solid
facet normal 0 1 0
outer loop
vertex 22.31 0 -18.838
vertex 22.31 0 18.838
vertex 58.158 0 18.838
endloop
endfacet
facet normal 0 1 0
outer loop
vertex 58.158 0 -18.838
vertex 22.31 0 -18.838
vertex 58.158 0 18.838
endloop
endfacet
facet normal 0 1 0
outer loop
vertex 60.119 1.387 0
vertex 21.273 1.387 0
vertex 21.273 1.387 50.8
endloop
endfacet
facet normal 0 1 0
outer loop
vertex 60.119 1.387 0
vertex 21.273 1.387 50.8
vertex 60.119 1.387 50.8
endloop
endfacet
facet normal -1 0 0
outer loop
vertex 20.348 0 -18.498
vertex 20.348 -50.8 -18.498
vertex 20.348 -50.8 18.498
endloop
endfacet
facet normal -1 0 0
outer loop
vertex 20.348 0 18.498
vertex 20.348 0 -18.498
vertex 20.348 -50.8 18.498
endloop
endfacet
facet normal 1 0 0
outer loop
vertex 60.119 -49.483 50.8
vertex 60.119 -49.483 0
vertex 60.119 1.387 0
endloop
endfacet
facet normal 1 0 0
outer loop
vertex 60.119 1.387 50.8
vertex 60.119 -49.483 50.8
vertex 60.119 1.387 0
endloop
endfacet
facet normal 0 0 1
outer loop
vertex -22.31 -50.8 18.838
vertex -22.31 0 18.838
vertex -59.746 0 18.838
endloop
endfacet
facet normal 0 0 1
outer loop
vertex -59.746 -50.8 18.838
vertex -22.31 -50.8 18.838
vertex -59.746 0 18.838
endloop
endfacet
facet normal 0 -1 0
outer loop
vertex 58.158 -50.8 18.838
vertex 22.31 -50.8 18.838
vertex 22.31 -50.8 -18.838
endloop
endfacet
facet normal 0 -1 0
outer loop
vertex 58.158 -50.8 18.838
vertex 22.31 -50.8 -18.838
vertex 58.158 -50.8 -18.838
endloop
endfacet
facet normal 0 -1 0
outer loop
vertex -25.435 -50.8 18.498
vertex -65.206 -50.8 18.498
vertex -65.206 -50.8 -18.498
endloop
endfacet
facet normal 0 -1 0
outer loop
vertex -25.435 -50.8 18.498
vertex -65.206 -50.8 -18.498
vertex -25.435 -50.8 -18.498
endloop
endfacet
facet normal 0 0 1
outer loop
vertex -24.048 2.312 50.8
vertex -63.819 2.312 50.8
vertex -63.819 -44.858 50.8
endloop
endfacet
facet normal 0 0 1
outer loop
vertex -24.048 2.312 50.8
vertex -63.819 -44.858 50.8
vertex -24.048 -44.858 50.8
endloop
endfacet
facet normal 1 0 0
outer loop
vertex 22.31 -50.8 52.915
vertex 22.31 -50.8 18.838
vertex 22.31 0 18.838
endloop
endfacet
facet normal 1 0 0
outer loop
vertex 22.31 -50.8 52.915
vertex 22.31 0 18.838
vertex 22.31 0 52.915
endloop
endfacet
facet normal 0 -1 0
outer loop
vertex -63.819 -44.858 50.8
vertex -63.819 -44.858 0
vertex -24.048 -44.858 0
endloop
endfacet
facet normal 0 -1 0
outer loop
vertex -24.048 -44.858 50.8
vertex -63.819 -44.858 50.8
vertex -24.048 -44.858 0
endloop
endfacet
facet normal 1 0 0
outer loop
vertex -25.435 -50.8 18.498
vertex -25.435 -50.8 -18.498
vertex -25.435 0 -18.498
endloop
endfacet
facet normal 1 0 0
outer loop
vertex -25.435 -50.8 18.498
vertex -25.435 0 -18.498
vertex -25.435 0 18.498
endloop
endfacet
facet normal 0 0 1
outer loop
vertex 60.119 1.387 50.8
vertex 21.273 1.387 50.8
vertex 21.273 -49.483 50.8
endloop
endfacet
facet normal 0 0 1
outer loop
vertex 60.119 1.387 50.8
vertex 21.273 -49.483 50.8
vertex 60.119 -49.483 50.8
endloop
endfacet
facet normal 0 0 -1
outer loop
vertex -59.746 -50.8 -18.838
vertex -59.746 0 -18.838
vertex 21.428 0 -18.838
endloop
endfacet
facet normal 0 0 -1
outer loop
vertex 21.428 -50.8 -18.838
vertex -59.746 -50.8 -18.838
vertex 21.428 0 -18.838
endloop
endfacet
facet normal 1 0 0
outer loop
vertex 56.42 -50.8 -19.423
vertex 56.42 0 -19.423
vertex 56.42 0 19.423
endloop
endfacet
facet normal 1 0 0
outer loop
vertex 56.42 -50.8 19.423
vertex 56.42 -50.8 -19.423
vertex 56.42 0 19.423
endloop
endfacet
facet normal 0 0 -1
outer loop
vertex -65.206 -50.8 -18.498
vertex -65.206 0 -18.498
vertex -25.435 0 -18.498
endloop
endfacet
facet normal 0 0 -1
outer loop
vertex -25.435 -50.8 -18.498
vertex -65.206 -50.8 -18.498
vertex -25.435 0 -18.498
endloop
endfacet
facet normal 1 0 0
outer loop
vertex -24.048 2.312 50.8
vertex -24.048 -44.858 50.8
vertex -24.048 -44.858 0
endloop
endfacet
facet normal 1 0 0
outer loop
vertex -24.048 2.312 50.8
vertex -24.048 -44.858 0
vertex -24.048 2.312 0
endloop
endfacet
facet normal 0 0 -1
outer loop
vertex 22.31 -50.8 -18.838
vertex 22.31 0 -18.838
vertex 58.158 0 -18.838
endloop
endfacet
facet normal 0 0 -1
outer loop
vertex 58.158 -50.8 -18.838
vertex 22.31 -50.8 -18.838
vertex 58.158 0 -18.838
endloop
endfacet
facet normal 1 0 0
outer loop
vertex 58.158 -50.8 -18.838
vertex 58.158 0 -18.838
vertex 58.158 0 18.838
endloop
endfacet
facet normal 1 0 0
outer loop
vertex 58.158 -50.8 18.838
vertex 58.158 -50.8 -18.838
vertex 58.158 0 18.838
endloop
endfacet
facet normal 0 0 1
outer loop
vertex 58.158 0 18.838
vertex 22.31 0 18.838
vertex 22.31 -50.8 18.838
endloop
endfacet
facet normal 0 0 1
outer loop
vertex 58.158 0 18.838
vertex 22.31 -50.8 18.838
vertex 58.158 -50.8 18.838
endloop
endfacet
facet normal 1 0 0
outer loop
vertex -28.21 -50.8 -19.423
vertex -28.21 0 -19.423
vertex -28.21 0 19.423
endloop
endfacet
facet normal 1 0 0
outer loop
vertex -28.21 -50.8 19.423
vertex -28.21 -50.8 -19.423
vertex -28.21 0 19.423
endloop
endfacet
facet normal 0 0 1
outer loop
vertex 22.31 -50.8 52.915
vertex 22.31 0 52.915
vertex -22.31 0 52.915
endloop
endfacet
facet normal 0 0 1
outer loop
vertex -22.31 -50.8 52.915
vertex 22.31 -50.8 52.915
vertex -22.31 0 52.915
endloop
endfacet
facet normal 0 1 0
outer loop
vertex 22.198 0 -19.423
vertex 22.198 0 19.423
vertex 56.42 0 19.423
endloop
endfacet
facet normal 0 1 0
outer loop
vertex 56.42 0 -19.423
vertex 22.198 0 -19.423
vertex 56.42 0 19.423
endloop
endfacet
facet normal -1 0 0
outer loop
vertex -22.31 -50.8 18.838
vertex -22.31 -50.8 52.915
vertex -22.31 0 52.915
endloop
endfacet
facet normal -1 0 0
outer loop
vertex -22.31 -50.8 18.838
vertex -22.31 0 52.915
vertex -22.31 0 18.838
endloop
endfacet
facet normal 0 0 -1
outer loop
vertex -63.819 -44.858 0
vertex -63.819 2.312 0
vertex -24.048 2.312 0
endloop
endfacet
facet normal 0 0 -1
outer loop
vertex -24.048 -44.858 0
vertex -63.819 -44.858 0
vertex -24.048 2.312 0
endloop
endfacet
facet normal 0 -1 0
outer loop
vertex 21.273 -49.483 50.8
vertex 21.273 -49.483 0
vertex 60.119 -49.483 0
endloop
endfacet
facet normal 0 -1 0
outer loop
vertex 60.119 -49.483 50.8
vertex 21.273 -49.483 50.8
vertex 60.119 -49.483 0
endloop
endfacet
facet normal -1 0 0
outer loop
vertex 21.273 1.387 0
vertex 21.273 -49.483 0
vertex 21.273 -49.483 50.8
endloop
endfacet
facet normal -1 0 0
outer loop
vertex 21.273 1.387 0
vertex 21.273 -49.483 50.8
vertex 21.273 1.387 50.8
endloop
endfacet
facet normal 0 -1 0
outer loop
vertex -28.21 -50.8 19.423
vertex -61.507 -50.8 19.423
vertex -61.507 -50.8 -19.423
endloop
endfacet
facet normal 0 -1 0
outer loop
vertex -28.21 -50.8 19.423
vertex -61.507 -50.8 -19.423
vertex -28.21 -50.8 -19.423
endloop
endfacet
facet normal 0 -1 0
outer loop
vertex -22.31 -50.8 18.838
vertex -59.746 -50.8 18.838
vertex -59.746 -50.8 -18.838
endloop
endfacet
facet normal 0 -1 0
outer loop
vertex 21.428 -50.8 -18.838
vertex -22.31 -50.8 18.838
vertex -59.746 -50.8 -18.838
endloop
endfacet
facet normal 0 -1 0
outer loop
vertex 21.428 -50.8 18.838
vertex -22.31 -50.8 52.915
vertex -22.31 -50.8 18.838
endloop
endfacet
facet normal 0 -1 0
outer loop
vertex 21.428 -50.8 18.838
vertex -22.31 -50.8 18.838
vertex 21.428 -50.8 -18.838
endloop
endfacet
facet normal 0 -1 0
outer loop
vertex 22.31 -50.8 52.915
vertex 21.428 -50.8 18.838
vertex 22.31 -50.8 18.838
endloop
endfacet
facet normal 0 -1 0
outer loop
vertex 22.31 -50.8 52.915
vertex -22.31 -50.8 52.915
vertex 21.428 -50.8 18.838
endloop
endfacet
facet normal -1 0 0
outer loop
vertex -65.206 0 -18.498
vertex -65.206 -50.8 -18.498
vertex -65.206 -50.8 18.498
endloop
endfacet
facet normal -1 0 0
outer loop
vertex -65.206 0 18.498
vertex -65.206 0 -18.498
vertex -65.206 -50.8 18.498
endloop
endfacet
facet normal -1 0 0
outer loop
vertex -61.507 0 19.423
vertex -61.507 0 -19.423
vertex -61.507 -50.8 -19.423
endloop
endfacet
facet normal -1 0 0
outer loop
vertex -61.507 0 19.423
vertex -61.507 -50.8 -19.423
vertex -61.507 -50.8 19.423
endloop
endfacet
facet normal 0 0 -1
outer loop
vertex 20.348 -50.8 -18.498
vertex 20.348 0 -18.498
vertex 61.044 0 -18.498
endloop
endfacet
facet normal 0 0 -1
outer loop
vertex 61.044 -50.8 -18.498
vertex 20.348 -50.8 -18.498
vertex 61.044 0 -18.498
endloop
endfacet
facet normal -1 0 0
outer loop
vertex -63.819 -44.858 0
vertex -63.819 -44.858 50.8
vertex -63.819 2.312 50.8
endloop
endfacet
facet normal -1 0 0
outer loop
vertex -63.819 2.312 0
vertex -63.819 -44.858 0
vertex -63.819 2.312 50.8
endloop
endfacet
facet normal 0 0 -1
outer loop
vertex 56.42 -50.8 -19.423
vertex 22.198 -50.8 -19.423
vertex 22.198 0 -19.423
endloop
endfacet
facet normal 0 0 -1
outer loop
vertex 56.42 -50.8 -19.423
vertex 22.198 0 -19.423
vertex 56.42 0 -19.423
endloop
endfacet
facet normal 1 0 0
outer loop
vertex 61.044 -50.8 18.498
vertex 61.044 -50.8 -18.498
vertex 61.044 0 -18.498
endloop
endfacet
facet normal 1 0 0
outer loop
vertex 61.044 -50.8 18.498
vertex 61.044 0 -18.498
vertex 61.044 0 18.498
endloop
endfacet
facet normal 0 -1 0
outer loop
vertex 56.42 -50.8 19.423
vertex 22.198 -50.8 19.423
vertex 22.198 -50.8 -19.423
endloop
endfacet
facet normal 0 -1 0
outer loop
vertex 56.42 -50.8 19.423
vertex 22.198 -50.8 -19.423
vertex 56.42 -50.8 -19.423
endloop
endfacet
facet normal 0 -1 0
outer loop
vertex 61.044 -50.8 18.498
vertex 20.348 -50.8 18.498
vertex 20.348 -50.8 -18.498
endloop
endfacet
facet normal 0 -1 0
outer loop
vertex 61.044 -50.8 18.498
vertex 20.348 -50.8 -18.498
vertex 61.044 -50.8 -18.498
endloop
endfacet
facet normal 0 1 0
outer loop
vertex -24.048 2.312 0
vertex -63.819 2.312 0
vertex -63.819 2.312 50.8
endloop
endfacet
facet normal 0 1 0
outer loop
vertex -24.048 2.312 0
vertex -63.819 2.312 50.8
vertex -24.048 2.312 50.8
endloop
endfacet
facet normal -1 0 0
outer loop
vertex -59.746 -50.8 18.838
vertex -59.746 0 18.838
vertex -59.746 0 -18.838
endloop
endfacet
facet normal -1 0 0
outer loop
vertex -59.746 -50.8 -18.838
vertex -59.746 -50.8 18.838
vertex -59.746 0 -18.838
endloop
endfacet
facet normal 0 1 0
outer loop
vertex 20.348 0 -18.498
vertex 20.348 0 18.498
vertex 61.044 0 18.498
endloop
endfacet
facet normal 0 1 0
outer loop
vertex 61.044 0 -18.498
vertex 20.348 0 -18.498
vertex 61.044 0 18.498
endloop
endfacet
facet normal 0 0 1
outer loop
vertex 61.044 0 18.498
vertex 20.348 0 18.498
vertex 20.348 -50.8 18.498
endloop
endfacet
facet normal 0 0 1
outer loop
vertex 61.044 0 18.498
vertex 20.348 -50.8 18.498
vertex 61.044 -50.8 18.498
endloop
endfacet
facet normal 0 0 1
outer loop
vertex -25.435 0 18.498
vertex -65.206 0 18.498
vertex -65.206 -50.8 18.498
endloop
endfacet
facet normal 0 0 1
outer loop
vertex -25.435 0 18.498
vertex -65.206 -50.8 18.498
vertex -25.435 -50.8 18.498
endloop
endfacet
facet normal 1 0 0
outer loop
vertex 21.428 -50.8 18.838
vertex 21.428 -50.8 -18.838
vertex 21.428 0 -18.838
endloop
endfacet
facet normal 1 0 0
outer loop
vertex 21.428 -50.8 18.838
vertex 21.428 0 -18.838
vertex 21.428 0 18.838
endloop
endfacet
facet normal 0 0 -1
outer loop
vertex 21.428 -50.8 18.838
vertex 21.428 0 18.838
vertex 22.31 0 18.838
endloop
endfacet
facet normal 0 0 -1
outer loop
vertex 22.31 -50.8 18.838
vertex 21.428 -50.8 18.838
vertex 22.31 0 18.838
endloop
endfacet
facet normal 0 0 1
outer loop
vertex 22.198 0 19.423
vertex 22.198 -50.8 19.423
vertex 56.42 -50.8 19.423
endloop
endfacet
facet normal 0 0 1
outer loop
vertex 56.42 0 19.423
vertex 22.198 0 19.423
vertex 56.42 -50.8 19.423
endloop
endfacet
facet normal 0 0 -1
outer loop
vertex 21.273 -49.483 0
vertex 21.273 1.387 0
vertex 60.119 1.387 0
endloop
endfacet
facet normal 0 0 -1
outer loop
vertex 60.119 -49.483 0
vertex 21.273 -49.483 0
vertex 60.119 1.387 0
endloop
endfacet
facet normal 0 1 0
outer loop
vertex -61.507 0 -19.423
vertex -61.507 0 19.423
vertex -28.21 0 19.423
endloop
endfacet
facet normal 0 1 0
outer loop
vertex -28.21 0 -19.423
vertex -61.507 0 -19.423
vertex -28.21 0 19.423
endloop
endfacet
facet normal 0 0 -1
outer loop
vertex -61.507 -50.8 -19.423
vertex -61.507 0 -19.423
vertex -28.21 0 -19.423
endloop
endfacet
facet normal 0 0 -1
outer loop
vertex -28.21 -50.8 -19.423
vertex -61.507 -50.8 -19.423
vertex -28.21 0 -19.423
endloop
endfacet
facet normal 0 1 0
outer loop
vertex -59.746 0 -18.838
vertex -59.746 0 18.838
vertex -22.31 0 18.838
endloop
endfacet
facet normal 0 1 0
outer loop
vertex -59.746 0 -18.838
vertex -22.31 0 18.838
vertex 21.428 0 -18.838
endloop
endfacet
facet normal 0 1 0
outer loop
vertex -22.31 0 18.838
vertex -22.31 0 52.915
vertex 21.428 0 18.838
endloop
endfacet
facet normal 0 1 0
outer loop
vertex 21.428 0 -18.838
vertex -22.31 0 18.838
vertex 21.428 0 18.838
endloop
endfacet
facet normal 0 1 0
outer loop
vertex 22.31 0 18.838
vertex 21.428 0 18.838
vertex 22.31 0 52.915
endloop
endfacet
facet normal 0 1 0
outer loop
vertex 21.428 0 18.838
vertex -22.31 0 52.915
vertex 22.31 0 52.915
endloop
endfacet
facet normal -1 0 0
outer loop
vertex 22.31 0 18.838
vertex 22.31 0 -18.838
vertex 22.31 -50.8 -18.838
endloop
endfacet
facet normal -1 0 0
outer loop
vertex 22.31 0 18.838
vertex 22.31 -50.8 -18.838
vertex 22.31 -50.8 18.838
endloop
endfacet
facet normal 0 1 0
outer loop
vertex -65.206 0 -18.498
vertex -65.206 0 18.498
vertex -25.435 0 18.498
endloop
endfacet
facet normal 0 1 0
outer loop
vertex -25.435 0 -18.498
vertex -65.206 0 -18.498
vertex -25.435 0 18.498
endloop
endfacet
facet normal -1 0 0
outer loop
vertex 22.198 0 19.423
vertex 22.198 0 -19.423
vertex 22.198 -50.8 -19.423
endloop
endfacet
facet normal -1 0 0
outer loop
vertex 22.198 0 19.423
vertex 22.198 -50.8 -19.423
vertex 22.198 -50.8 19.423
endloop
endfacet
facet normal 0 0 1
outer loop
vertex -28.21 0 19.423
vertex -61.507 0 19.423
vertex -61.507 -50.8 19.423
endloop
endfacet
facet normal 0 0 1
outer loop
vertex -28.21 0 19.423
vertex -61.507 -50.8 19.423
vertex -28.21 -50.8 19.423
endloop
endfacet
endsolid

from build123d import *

# Parameters (mm, degrees)
F0_W     = 35.8476921521
F0_H     = 37.6757253713
F1_DEPTH = 50.8
F0_W_2   = 42.0716410177
F0_W_3   = 0.7847153441
F2_W     = 39.7713258862
F2_H     = 36.9965732098
F3_DEPTH = 50.8
F2_W_2   = 40.696233511
F4_W     = 33.2969166338
F4_H     = 38.8464033604
F5_DEPTH = 50.8
F4_W_2   = 34.2218503356
F6_W     = 38.8464033604
F6_H     = 50.8703030646
F7_DEPTH = 50.8
F6_W_2   = 39.7713184357
F6_H_2   = 47.1706353128


with BuildPart() as f1:
    # F0 (on Front) → F1 (new body)
    with BuildSketch(Plane.XZ):
        with Locations((40.2337796986, 0)):
            Rectangle(F0_W, F0_H)
    extrude(amount=F1_DEPTH)


with BuildPart() as f1b:
    # F0 (on Front) → F1, piece 2 (new body)
    with BuildSketch(Plane.XZ):
        with Locations((0.392357672, 0)):
            Rectangle(F0_W_2, F0_H)
        with Locations((-21.0358205089, 0)):
            Rectangle(F0_W_3, F0_H)
        Polygon((-20.6434628368, 18.8378626856), (21.4281781809, 18.8378626856), (22.3099336226, 18.8378626856), (22.3099336226, 52.9146460188), (-22.3099336226, 52.9146460188), (-22.3099336226, 18.8378626856), (-21.4281781809, 18.8378626856), align=None)
        Polygon((-59.746069642, -18.8378626856), (-21.4281781809, -18.8378626856), (-21.4281781809, 18.8378626856), (-22.3099336226, 18.8378626856), (-59.746069642, 18.8378626856), align=None)
    extrude(amount=F1_DEPTH)


with BuildPart() as f3:
    # F2 (on Front) → F3 (new body)
    with BuildSketch(Plane.XZ):
        with Locations((-45.3208126128, 0)):
            Rectangle(F2_W, F2_H)
    extrude(amount=F3_DEPTH)


with BuildPart() as f3b:
    # F2 (on Front) → F3, piece 2 (new body)
    with BuildSketch(Plane.XZ):
        with Locations((40.6962372363, 0)):
            Rectangle(F2_W_2, F2_H)
    extrude(amount=F3_DEPTH)


with BuildPart() as f5:
    # F4 (on Front) → F5 (new body)
    with BuildSketch(Plane.XZ):
        with Locations((-44.8583513498, 0)):
            Rectangle(F4_W, F4_H)
    extrude(amount=F5_DEPTH)


with BuildPart() as f5b:
    # F4 (on Front) → F5, piece 2 (new body)
    with BuildSketch(Plane.XZ):
        with Locations((39.308860898, 0)):
            Rectangle(F4_W_2, F4_H)
    extrude(amount=F5_DEPTH)


with BuildPart() as f7:
    # F6 (on Top) → F7 (new body)
    with BuildSketch(Plane.XY):
        with Locations((40.6962372363, -24.0477714688)):
            Rectangle(F6_W, F6_H)
    extrude(amount=F7_DEPTH)


with BuildPart() as f7b:
    # F6 (on Top) → F7, piece 2 (new body)
    with BuildSketch(Plane.XY):
        with Locations((-43.9334362745, -21.2730299681)):
            Rectangle(F6_W_2, F6_H_2)
    extrude(amount=F7_DEPTH)


solid = Compound([f1.part, f1b.part, f3.part, f3b.part, f5.part, f5b.part, f7.part, f7b.part])
